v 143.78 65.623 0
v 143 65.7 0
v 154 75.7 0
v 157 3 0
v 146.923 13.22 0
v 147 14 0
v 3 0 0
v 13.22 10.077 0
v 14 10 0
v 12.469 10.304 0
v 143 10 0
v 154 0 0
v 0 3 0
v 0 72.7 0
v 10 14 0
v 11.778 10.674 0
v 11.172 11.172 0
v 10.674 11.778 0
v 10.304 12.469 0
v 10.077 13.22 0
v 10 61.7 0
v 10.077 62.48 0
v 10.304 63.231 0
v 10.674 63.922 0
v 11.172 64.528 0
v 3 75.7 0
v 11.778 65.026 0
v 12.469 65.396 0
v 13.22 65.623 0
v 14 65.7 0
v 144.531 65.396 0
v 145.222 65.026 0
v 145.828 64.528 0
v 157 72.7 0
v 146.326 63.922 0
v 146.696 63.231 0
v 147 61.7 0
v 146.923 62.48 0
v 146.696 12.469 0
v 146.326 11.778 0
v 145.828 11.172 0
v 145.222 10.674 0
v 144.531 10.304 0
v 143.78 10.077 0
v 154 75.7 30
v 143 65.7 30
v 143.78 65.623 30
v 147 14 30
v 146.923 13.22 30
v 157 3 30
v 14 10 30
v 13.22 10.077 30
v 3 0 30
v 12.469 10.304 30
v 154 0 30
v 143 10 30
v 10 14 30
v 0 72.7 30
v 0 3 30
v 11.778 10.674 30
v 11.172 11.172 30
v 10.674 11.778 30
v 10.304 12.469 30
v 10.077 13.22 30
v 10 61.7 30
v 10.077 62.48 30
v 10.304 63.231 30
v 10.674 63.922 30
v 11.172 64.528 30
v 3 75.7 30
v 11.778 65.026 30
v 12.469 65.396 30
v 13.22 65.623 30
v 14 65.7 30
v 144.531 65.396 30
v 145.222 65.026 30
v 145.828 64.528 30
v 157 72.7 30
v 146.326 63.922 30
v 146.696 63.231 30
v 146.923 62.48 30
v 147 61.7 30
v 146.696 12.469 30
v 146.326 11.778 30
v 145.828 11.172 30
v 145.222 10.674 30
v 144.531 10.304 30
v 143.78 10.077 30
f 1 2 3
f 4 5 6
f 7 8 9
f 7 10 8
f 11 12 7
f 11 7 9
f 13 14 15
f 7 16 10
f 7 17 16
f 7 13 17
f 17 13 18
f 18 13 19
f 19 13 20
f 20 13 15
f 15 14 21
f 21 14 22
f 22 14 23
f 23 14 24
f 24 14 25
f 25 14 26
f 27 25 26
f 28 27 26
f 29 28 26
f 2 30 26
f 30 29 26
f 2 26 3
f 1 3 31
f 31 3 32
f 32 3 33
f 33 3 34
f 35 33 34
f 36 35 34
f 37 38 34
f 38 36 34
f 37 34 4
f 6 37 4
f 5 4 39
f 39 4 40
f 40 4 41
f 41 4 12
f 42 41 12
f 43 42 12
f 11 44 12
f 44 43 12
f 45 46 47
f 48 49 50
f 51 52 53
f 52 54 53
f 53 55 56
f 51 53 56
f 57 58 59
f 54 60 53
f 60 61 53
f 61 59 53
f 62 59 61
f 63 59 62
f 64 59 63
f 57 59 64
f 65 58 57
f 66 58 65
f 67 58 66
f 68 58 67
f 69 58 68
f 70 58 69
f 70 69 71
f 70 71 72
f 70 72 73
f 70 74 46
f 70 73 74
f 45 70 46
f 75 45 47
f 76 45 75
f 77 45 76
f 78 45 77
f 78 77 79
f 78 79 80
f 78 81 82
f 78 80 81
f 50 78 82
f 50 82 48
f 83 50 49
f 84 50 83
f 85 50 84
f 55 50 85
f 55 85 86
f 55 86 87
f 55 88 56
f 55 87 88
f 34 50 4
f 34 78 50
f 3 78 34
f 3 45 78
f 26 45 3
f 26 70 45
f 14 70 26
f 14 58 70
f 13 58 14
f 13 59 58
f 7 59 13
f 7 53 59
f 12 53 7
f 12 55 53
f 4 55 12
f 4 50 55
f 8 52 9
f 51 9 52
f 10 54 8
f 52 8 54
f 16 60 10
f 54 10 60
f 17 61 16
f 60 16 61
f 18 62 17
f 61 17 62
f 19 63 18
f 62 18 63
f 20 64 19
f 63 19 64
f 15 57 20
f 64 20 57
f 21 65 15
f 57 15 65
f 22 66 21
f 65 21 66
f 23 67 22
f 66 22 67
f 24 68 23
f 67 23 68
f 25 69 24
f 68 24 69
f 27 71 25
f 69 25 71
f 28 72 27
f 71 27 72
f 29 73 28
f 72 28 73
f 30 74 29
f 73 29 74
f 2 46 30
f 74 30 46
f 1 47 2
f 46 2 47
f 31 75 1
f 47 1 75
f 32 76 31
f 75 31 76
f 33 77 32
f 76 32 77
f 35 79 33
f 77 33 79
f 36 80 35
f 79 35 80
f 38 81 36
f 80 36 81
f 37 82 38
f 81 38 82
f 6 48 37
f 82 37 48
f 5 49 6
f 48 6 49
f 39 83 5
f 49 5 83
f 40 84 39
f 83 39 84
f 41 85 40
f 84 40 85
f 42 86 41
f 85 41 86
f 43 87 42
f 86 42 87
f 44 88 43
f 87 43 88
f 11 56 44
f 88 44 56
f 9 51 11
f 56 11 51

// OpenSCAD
// file: 2026-11-05_interior.scad
// 2026-11-05: acrylic inside the box: tunnel (floor, 2 walls, perforated deck) around the bought
// desiccant pan, and the 2 spool holders' plates and strips. One source for these sizes: the
// assembly draws them and its cut list prints them from here. Butt joints, solvent cement.
// NEXT TIME (2026-11-12, not applied; the current cut files are butt joints): the butt-jointed
// tunnel needed printed jigs (2026-11-11_tunnel_jig.scad) to hold it straight for gluing. On a
// re-cut, give the walls tabs along their top and bottom edges into through-slots in the deck and
// floor, like the shell's finger joints. The walls can then only land at tun_in apart and the
// glue-up squares itself, with no jigs. Keep the slots clear of the deck holes and the vents, and use
// the looser kerf (about 0.20; 0.25 needed a mallet on the shell).
// 2026-11-11: pan measured (SS6152): 153 x 384 x 51, straight walls (153 across the top is the
// widest), wire handles stand 9 off each end (402 overall), 5 mm wire, its underside 6.5 above
// the pan's bottom. The acrylic tray is dropped. Nested on 908-long pieces (cut with the film off):
// part = "floor_deck" (rip from sheet 1, at least 176 wide) | "walls_strips" (166 offcut)
//      | "plates" (154 offcut) | "gasket" (2 feeder gaskets, EVA) | "cord_plug" (spare).
// Units mm. Pieces lie flat, corner at the origin.

use <2026-10-30_dry_box_panels.scad>
use <2026-11-04_spool_holder.scad>

part = "floor_deck";

sd = shell_dims();
X = sd[0]; Y = sd[1]; Z = sd[2]; t = sd[3]; ext = sd[4];
back_in = Y - t;
dr      = [153, 384, 51]; dr_air = 25;    // pan body x, y, z (measured); air gap above it
pan_so  = 9; pan_wire = [5, 6.5];         // handle stand-off past each end; wire d, its underside above the pan bottom
tun_in  = dr[0] + 4;                      // between the tunnel walls: 2 clear per side
tun_w   = tun_in + 2 * t;
tun_l   = back_in - ext - 0.5;            // floor and walls: back wall to the front frame member
deck_l  = back_in - 1;                    // deck: runs on over the frame member
wall_h  = dr[2] + dr_air;
vent_d  = 16; vent_p = 32;
deck_d  = 12; deck_p = 24;

function int_dr()  = dr;
function int_pan_hdl() = [pan_so, pan_wire[0], pan_wire[1] + pan_wire[0] / 2];   // stand-off, wire d, lower wire centre z
function int_air() = dr_air;
function int_tun() = [tun_in, tun_w, tun_l, deck_l, wall_h];

module deck2d() difference() {            // holes stay clear of the walls below (5 across: 24 in from each wall)
    square([tun_w, deck_l]);
    for (ix = [-2 : 2], iy = [0 : 15]) translate([tun_w / 2 + ix * deck_p, 29 + iy * deck_p]) circle(d = hole(deck_d), $fn = 32);
}
module floor2d() square([tun_w, tun_l]);
module wall2d() difference() {            // x along the box's depth, y up; vents in the air gap
    square([tun_l, wall_h]);
    for (y = [21.5 : vent_p : tun_l - 10]) translate([y, wall_h - dr_air / 2]) circle(d = hole(vent_d), $fn = 48);
}
// feeder gasket: EVA, on the port (seen from inside the box); case screws at +10 above the port
module gasket2d() {
    pd = 26; cd = 46.9;                    // collet and case screw spacing (panels file)
    difference() {
        offset(r = 6, $fn = 48) square([pd + 16, 16], center = true);
        hull() for (s = [-1, 1]) translate([s * pd / 2, 0]) circle(d = 16.4, $fn = 48);
        for (s = [-1, 1]) translate([s * cd / 2, 10]) circle(d = 3.2, $fn = 32);
    }
}

// 2026-11-14: full feeder gasket, EVA: covers the whole outlet face, 56.6 tall x the same 54 wide
// as gasket2d. Top edge at the feeder's top (the top panel's underside); collets 40 and case
// screws 30 below it (panels file). Origin at the gasket's top center, y down is negative.
gf_h = 56.6; gf_w = 26 + 16 + 12;          // 54, gasket2d's outside width
module gasket_full2d() {
    pd = 26; cd = 46.9;
    difference() {
        translate([-gf_w / 2, -gf_h]) offset(r = 3, $fn = 32) offset(delta = -3) square([gf_w, gf_h]);
        hull() for (s = [-1, 1]) translate([s * pd / 2, -40]) circle(d = 16.4, $fn = 48);
        for (s = [-1, 1]) translate([s * cd / 2, -30]) circle(d = 3.2, $fn = 32);
    }
}

// cord hole plug: pushes in from outside the back panel, 3 crush ribs in the hole, flange on an
// EVA ring. Prints flange down. A heater later gets a plug with its own cord hole.
ch = cord_hole();
module cord_plug() {
    cylinder(d = ch[0] + 10, h = 2, $fn = 64);
    translate([0, 0, 2]) {
        cylinder(d = ch[0] - 0.4, h = t, $fn = 64);
        for (a = [0, 120, 240]) rotate(a) translate([ch[0] / 2 - 1, -0.6, 0]) cube([1.2, 1.2, t]);
    }
}
module cord_ring2d() difference() { circle(d = ch[0] + 10, $fn = 64); circle(d = ch[0] + 0.4, $fn = 64); }

// nests on 908-long pieces, x along the 908, y = 0 on the factory (or straightest) edge
L = 908; m = 5; g = 3;
module cut() offset(delta = 0.125) children();
module along(l) translate([l, 0]) rotate(90) children();   // a [w, l] piece turned to lie along x
module floor_deck() {                    // rip from sheet 1: needs m + tun_w + 2 = 175.6
    translate([m, m]) along(deck_l) cut() deck2d();
    translate([m + deck_l + 2 * g, m]) along(tun_l) cut() floor2d();
}
module walls_strips() {                  // 166 offcut: walls side by side, then the 4 holder strips
    for (i = [0 : 1]) translate([m, m + i * (wall_h + g)]) cut() wall2d();
    for (i = [0 : 3]) translate([m + tun_l + 2 * g, m + i * (35 + g)]) cut() strip2d();
}
module plates() {                        // 154 offcut: 4 outer + 2 middle, 2 rows of 3
    for (i = [0 : 5]) translate([m + 88 + (i % 3) * (176 + g), m + floor(i / 3) * (50 + g)]) cut() plate2d(i < 4);
}
if (part == "floor_deck") floor_deck();
else if (part == "walls_strips") walls_strips();
else if (part == "plates") plates();
else if (part == "gasket") for (i = [0 : 1]) translate([40, 25 + i * 40]) gasket2d();
else if (part == "gasket_full") for (i = [0 : 1]) translate([5 + gf_w / 2 + i * (gf_w + 3), 5 + gf_h]) gasket_full2d();
else if (part == "cord_plug") cord_plug();

echo(str("floor_deck: x to ", m + deck_l + 2 * g + tun_l, " of ", L, ", y to ", m + tun_w,
         "; walls_strips: y to ", m + 2 * wall_h + g,
         "; plates: y to ", m + 2 * 50 + g, "; tunnel in ", tun_in, " x wall ", wall_h, "; pan ", dr, " + ", 2 * pan_so));
// main file
// 2026-11-11: tunnel glue-up jig, print 2. Sits on the tunnel floor between the walls, one near
// each end, while the solvent cement cures. Its width sets the walls 157 apart and its square
// sides hold them at 90 degrees to the floor; it stops 0.3 below the wall tops so the deck can
// be clamped down onto the walls (the jig keeps the walls from bowing in under the clamp).
// Chamfered edges at all 4 inside corners leave room for squeeze-out, so the jig never touches
// the wet joints and slides out the open end afterwards. The STL lies flat on its 157 x 75.7 face
// (the 157 and the square corners are in the bed plane, where the printer is most accurate), no supports.
// part = "jig" | "view" (2 jigs in the tunnel, deck lifted). Units mm.

use <2026-11-05_interior.scad>

part = "jig";

tn     = int_tun();                      // [tun_in, tun_w, tun_l, deck_l, wall_h]
tun_in = tn[0]; wall_h = tn[4];
t      = 5.8;
jig_w  = tun_in;                         // 157: sets the walls
jig_h  = wall_h - 0.3;                   // deck rests on the walls, not the jig
jig_d  = 30;                             // along the tunnel
rel    = 3;                              // squeeze-out chamfer at each inside corner
bar    = 10;                             // frame bar width (window in the middle saves filament)

module profile() difference() {
    polygon([[rel, 0], [jig_w - rel, 0], [jig_w, rel], [jig_w, jig_h - rel],
             [jig_w - rel, jig_h], [rel, jig_h], [0, jig_h - rel], [0, rel]]);
    translate([bar, bar]) offset(r = 4, $fn = 32) offset(delta = -4) square([jig_w - 2 * bar, jig_h - 2 * bar]);
}
module jig() rotate([90, 0, 0]) translate([0, 0, -jig_d]) linear_extrude(jig_d) profile();   // standing in the tunnel

if (part == "jig") linear_extrude(jig_d) profile();   // print orientation
else if (part == "view") {
    tun_w = tn[1]; tun_l = tn[2];
    color([0.80, 0.88, 1.0, 0.6]) cube([tun_w, tun_l, t]);                                  // floor
    for (x = [0, tun_w - t]) color([0.80, 0.88, 1.0, 0.6]) translate([x, 0, t]) cube([t, tun_l, wall_h]);
    color([0.85, 0.92, 1.0, 0.35]) translate([0, -5, t + wall_h + 40]) cube([tun_w, tn[3], t]);   // deck, lifted
    for (y = [20, tun_l - 20 - jig_d]) color("orange") translate([t, y, t]) jig();
}
echo(str("jig ", jig_w, " wide x ", jig_h, " tall x ", jig_d, " deep (walls ", wall_h, ")"));
